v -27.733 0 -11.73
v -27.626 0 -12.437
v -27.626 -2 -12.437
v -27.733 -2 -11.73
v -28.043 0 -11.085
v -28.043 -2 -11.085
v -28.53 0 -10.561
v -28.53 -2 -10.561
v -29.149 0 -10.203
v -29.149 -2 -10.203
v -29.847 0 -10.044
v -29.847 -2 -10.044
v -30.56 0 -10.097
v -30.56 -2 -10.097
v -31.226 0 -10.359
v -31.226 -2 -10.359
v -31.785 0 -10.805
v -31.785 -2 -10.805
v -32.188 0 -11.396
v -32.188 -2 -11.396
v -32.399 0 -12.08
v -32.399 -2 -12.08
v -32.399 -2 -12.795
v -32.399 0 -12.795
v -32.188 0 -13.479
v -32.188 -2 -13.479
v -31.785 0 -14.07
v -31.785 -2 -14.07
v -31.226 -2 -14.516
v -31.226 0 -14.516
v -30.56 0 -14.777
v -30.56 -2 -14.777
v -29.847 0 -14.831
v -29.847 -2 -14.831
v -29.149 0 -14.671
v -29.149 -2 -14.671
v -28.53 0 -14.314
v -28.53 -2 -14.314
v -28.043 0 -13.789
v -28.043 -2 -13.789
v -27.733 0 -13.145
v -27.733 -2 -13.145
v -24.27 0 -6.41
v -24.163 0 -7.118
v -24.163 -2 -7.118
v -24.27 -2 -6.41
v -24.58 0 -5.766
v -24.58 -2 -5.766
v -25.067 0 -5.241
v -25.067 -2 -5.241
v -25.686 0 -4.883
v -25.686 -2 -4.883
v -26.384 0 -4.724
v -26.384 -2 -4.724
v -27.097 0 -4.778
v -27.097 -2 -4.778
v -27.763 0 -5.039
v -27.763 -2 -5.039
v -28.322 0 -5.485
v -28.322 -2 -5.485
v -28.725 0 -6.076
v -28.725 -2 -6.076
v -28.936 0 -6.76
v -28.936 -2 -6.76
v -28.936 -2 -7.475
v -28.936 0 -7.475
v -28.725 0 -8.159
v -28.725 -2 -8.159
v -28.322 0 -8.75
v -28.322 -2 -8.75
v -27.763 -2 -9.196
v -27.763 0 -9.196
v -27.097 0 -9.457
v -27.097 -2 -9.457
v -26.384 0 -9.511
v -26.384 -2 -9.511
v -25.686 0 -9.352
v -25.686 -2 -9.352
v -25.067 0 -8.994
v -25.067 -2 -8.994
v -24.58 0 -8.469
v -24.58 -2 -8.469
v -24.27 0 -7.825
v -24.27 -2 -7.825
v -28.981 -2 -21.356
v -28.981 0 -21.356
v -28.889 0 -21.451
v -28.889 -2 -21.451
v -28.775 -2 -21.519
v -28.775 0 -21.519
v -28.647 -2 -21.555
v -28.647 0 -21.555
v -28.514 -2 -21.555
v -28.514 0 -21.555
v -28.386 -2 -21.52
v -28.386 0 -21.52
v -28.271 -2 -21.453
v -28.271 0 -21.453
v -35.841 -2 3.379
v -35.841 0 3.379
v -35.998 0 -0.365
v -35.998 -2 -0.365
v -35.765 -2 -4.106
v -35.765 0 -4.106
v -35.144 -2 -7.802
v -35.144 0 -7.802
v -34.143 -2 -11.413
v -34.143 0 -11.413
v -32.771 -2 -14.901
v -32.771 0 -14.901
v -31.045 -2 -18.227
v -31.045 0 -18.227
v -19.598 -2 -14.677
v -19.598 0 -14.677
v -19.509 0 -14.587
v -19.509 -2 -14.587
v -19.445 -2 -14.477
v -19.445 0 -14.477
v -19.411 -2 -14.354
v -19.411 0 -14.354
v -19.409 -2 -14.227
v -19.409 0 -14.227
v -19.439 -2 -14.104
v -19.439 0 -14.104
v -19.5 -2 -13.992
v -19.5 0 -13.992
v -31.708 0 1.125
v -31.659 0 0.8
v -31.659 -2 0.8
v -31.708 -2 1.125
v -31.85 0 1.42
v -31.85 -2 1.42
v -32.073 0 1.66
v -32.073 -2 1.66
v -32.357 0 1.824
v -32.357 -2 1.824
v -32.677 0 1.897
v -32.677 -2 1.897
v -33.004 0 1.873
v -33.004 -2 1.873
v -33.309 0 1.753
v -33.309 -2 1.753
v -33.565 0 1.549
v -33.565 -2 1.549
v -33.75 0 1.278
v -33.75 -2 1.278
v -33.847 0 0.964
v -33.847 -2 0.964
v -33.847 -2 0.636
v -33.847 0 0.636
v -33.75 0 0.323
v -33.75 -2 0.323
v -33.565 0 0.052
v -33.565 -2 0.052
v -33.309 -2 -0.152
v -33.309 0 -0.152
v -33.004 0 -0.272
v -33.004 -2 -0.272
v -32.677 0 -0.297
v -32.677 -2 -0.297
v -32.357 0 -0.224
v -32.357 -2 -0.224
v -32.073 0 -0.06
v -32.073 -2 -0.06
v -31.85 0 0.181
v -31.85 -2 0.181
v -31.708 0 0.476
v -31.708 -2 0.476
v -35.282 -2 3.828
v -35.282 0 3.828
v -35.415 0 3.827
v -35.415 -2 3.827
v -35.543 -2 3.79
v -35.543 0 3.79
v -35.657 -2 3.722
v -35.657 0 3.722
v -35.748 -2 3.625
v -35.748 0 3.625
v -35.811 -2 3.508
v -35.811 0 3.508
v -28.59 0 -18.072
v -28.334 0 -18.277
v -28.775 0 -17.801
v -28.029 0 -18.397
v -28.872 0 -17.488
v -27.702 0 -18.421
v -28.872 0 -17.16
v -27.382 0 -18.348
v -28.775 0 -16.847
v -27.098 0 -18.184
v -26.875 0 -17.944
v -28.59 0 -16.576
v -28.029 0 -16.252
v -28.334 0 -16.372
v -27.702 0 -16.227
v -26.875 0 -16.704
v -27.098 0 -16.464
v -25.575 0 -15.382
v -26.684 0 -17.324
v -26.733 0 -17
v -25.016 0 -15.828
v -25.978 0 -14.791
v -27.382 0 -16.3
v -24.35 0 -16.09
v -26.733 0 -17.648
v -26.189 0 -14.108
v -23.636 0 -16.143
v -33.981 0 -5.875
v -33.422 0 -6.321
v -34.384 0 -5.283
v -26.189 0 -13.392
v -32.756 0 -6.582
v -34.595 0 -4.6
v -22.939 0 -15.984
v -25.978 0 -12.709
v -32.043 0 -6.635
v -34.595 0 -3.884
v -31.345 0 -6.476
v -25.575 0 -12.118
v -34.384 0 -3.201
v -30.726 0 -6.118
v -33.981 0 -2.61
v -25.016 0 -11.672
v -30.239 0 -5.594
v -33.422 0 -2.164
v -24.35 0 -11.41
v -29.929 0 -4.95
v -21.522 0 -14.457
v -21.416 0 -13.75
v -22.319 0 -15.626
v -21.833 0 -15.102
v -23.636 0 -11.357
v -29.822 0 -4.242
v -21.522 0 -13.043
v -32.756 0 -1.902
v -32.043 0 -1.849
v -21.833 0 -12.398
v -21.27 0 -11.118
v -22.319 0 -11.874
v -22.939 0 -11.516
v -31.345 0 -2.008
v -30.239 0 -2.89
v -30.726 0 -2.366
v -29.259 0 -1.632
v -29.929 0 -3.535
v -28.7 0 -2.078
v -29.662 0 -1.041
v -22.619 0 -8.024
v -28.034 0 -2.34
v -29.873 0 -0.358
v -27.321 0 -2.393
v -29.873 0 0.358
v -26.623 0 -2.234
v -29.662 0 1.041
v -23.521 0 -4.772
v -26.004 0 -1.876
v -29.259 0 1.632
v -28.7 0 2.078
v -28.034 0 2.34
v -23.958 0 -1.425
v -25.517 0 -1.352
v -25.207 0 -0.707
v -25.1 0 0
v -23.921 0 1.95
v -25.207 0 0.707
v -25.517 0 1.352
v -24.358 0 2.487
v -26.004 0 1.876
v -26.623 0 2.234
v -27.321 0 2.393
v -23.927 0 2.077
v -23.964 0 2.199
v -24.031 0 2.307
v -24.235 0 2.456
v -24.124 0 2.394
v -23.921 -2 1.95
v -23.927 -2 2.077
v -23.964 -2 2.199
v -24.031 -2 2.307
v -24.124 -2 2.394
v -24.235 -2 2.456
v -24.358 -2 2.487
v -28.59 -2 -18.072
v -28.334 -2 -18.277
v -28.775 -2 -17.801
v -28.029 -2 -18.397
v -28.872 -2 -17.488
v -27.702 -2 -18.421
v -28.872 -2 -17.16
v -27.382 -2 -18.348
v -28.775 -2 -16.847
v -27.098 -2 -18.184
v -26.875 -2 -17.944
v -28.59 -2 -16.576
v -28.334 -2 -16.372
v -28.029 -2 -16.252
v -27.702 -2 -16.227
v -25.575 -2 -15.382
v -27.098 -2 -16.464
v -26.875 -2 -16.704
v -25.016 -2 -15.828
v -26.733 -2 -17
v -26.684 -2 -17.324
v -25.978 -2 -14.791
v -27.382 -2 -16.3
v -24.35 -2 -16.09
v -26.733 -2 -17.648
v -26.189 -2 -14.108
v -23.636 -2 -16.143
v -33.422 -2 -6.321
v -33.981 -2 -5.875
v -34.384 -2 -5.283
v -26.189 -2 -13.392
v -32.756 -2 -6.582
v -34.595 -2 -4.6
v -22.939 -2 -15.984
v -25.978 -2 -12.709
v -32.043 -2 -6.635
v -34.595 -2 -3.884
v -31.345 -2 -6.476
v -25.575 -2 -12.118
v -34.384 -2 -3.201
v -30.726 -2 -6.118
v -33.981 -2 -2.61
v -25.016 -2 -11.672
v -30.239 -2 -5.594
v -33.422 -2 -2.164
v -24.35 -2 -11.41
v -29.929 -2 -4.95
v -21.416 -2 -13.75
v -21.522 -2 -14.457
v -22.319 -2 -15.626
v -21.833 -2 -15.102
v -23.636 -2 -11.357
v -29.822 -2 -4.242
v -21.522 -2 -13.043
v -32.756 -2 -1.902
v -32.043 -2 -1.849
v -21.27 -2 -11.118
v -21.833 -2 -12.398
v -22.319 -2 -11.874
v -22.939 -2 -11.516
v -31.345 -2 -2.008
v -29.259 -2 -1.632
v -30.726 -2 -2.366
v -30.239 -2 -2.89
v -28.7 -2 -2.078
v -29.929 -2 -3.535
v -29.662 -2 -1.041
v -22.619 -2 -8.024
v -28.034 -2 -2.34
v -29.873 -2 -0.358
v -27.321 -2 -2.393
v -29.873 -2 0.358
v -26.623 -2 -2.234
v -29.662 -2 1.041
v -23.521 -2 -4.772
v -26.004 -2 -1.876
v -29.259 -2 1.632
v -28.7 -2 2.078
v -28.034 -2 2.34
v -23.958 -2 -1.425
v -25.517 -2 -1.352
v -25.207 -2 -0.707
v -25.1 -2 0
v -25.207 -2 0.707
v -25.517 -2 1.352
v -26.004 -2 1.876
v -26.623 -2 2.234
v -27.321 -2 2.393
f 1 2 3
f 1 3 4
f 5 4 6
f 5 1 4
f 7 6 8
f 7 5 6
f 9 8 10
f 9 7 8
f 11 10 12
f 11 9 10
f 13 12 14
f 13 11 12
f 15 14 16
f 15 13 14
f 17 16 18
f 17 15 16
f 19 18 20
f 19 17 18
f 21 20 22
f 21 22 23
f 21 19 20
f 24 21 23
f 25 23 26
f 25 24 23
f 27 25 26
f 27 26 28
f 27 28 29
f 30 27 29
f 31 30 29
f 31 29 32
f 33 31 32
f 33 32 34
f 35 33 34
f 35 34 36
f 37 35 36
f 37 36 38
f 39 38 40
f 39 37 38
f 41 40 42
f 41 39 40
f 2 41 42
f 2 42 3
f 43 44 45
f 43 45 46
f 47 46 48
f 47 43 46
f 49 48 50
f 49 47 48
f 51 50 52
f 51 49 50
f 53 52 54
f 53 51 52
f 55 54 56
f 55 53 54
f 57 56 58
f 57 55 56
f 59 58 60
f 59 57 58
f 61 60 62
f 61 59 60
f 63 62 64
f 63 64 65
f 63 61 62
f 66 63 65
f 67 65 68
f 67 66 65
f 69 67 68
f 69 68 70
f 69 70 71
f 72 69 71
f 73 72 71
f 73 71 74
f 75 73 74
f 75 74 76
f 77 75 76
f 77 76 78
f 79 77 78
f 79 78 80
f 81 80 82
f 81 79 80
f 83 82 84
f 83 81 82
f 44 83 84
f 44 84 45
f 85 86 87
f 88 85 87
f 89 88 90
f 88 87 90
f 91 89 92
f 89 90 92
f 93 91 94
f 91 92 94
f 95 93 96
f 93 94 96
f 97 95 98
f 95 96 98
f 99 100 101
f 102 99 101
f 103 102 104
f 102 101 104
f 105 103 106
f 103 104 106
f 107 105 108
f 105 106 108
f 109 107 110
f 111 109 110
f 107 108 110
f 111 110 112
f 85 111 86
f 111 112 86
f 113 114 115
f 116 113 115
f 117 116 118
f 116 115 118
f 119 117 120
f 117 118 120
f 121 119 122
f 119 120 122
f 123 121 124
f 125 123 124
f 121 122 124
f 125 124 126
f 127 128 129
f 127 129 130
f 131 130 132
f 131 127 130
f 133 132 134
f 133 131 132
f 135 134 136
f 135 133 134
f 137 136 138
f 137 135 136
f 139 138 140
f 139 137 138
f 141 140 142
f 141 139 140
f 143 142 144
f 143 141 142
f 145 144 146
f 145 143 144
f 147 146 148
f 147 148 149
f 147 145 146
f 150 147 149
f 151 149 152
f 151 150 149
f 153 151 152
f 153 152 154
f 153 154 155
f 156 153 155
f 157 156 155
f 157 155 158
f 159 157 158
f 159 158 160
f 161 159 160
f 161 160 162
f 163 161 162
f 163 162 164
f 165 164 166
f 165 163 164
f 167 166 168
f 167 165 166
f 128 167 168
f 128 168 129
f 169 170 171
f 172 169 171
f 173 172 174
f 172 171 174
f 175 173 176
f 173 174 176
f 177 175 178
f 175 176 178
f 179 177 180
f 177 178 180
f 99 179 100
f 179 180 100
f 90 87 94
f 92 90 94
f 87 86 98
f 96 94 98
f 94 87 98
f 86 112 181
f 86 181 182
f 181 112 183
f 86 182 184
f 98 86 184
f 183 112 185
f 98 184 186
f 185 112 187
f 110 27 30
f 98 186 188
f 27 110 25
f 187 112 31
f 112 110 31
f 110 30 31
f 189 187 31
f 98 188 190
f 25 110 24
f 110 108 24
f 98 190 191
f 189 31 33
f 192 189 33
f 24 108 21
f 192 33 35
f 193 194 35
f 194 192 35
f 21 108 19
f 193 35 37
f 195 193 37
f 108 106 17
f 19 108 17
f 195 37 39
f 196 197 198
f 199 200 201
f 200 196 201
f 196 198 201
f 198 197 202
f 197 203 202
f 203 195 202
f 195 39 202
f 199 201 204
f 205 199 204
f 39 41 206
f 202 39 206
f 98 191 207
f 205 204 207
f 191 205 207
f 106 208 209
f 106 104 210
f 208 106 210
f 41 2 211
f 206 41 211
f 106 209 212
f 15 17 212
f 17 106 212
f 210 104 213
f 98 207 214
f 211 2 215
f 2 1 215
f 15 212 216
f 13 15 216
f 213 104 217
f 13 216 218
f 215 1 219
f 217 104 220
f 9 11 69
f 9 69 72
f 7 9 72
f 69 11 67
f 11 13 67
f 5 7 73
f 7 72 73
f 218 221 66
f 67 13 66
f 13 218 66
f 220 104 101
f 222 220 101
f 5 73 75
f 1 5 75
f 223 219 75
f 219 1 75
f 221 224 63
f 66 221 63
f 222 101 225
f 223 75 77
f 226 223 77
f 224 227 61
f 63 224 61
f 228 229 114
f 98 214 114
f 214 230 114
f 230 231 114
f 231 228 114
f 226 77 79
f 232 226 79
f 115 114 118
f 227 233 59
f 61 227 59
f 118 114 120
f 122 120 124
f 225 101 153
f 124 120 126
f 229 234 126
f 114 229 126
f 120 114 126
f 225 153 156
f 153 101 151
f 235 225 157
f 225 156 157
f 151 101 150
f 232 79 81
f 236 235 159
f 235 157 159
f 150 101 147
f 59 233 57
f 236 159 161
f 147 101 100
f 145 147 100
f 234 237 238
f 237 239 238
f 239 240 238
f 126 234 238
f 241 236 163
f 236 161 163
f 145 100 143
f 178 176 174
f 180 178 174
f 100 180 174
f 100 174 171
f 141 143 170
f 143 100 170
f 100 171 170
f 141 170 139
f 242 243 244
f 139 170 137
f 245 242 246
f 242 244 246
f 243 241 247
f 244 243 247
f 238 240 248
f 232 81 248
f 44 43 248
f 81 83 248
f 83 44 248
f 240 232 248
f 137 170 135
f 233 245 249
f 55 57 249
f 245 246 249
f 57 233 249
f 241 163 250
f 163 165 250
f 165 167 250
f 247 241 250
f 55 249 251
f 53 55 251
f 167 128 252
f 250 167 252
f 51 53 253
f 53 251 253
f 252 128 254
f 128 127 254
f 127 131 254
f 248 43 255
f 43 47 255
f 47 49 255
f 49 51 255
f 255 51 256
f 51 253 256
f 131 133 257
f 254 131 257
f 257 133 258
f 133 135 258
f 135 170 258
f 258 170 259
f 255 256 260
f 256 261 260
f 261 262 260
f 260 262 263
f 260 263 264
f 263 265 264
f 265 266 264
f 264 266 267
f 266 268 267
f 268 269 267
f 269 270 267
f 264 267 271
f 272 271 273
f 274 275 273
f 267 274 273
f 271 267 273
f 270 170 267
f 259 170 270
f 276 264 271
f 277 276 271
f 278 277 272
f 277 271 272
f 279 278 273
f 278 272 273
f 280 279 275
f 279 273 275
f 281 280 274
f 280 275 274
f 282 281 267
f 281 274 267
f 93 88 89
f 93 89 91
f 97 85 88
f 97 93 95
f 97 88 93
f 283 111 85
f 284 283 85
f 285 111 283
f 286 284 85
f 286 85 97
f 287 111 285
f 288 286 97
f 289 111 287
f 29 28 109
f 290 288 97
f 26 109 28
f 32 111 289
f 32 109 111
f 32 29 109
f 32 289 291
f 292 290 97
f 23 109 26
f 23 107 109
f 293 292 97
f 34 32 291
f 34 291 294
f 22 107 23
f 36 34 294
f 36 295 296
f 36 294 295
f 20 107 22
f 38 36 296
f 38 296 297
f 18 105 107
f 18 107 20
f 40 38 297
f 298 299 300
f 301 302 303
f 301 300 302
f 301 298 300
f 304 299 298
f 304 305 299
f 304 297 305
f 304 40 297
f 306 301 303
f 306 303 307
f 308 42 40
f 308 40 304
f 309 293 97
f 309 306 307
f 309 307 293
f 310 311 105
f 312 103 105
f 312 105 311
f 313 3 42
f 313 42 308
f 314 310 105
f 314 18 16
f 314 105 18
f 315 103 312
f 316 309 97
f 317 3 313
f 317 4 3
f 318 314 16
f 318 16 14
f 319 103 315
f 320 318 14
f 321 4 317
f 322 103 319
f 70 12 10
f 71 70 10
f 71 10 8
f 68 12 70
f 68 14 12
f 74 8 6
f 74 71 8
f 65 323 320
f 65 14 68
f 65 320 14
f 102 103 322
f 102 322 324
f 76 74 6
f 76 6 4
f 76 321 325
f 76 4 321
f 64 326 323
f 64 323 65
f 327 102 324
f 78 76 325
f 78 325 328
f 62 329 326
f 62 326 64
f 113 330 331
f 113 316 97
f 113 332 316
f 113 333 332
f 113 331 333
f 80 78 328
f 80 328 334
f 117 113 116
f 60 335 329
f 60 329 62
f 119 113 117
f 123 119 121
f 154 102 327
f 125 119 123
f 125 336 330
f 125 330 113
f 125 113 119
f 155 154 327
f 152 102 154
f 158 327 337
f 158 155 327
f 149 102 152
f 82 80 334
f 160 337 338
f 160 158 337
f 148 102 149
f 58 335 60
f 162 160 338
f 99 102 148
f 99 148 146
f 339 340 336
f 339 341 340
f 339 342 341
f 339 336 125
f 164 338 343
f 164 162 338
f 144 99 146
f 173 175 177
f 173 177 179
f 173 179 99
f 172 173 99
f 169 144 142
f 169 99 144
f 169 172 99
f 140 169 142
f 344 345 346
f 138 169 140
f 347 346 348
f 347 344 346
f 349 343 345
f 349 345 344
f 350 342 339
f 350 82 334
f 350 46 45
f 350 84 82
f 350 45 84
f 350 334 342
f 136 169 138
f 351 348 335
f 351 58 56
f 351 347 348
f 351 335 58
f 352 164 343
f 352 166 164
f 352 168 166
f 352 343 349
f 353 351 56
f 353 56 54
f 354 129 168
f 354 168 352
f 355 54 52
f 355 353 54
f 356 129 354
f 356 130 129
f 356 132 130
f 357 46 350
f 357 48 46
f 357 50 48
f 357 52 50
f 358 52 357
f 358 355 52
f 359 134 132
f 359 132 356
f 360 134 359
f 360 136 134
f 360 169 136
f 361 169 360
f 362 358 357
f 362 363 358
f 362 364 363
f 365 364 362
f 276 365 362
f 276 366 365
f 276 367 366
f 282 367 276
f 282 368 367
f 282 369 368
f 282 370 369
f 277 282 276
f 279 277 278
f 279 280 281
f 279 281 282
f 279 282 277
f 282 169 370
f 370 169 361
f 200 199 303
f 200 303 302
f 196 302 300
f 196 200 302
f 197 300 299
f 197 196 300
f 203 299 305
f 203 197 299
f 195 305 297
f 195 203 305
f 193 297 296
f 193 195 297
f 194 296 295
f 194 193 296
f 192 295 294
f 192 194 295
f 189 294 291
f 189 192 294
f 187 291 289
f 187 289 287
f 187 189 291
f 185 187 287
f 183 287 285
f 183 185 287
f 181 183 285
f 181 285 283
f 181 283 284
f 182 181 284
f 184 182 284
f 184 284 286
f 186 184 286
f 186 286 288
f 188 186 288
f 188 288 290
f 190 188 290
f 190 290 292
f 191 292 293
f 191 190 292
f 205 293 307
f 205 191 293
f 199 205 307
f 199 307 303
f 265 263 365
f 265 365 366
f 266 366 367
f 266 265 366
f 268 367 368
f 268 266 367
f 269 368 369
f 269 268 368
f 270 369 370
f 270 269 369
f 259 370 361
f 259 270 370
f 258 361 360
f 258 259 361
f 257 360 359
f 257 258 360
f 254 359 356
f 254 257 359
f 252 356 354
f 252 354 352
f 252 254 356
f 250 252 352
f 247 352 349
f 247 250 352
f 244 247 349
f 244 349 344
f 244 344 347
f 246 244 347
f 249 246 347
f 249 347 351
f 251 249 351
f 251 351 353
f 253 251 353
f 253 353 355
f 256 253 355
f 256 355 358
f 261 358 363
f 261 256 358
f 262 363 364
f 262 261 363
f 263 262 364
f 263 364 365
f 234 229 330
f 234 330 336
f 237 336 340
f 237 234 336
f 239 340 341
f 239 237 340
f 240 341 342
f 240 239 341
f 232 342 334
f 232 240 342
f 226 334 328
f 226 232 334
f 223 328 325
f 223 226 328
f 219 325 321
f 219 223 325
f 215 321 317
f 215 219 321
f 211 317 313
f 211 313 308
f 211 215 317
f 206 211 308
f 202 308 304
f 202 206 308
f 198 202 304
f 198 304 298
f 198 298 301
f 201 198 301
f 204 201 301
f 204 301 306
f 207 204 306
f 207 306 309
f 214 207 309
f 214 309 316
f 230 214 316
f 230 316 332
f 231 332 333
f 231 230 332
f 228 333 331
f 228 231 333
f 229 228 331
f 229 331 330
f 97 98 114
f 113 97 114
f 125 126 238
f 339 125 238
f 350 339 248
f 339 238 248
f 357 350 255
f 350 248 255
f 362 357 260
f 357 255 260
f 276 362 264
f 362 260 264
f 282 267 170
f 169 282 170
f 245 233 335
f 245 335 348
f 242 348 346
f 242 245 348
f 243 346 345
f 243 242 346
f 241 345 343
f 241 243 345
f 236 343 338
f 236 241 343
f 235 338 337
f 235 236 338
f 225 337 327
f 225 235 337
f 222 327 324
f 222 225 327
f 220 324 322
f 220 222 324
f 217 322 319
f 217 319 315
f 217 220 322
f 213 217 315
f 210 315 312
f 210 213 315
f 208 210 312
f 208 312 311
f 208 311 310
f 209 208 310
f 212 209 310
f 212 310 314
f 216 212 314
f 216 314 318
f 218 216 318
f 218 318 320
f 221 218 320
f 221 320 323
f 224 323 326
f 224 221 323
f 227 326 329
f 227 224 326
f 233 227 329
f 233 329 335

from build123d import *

# Parameters (mm, degrees)
F0_R     = 1.1
F0_R_2   = 2.4
F1_DEPTH = 2


with BuildPart() as f1:
    # F0 (on Front) → F1 (new body)
    with BuildSketch(Plane.XZ):
        with BuildLine():
            ThreePointArc((-19.499595, -13.991633), (-23.127131, -6.413721), (-23.920639, 1.950137))
            ThreePointArc((-23.920639, 1.950137), (-24.031346, 2.306574), (-24.358051, 2.487038))
            Line((-24.358051, 2.487038), (-35.282341, 3.828372))
            ThreePointArc((-35.282341, 3.828372), (-35.656626, 3.721729), (-35.841068, 3.37903))
            ThreePointArc((-35.841068, 3.37903), (-34.690696, -9.620582), (-28.981463, -21.355908))
            ThreePointArc((-28.981463, -21.355908), (-28.646861, -21.554664), (-28.271112, -21.453304))
            Line((-28.271112, -21.453304), (-19.598006, -14.677131))
            ThreePointArc((-19.598006, -14.677131), (-19.41091, -14.354178), (-19.499595, -13.991633))
        make_face()
        with Locations((-27.783877, -17.324135)):
            Circle(F0_R, mode=Mode.SUBTRACT)
        with Locations((-30.026085, -12.437212)):
            Circle(F0_R_2, mode=Mode.SUBTRACT)
        with Locations((-23.815699, -13.75)):
            Circle(F0_R_2, mode=Mode.SUBTRACT)
        with Locations((-26.56296, -7.117524)):
            Circle(F0_R_2, mode=Mode.SUBTRACT)
        with Locations((-32.221958, -4.242101)):
            Circle(F0_R_2, mode=Mode.SUBTRACT)
        with Locations((-32.758802, 0.800339)):
            Circle(F0_R, mode=Mode.SUBTRACT)
        with Locations((-27.5, 0)):
            Circle(F0_R_2, mode=Mode.SUBTRACT)
    extrude(amount=F1_DEPTH)


solid = f1.part
